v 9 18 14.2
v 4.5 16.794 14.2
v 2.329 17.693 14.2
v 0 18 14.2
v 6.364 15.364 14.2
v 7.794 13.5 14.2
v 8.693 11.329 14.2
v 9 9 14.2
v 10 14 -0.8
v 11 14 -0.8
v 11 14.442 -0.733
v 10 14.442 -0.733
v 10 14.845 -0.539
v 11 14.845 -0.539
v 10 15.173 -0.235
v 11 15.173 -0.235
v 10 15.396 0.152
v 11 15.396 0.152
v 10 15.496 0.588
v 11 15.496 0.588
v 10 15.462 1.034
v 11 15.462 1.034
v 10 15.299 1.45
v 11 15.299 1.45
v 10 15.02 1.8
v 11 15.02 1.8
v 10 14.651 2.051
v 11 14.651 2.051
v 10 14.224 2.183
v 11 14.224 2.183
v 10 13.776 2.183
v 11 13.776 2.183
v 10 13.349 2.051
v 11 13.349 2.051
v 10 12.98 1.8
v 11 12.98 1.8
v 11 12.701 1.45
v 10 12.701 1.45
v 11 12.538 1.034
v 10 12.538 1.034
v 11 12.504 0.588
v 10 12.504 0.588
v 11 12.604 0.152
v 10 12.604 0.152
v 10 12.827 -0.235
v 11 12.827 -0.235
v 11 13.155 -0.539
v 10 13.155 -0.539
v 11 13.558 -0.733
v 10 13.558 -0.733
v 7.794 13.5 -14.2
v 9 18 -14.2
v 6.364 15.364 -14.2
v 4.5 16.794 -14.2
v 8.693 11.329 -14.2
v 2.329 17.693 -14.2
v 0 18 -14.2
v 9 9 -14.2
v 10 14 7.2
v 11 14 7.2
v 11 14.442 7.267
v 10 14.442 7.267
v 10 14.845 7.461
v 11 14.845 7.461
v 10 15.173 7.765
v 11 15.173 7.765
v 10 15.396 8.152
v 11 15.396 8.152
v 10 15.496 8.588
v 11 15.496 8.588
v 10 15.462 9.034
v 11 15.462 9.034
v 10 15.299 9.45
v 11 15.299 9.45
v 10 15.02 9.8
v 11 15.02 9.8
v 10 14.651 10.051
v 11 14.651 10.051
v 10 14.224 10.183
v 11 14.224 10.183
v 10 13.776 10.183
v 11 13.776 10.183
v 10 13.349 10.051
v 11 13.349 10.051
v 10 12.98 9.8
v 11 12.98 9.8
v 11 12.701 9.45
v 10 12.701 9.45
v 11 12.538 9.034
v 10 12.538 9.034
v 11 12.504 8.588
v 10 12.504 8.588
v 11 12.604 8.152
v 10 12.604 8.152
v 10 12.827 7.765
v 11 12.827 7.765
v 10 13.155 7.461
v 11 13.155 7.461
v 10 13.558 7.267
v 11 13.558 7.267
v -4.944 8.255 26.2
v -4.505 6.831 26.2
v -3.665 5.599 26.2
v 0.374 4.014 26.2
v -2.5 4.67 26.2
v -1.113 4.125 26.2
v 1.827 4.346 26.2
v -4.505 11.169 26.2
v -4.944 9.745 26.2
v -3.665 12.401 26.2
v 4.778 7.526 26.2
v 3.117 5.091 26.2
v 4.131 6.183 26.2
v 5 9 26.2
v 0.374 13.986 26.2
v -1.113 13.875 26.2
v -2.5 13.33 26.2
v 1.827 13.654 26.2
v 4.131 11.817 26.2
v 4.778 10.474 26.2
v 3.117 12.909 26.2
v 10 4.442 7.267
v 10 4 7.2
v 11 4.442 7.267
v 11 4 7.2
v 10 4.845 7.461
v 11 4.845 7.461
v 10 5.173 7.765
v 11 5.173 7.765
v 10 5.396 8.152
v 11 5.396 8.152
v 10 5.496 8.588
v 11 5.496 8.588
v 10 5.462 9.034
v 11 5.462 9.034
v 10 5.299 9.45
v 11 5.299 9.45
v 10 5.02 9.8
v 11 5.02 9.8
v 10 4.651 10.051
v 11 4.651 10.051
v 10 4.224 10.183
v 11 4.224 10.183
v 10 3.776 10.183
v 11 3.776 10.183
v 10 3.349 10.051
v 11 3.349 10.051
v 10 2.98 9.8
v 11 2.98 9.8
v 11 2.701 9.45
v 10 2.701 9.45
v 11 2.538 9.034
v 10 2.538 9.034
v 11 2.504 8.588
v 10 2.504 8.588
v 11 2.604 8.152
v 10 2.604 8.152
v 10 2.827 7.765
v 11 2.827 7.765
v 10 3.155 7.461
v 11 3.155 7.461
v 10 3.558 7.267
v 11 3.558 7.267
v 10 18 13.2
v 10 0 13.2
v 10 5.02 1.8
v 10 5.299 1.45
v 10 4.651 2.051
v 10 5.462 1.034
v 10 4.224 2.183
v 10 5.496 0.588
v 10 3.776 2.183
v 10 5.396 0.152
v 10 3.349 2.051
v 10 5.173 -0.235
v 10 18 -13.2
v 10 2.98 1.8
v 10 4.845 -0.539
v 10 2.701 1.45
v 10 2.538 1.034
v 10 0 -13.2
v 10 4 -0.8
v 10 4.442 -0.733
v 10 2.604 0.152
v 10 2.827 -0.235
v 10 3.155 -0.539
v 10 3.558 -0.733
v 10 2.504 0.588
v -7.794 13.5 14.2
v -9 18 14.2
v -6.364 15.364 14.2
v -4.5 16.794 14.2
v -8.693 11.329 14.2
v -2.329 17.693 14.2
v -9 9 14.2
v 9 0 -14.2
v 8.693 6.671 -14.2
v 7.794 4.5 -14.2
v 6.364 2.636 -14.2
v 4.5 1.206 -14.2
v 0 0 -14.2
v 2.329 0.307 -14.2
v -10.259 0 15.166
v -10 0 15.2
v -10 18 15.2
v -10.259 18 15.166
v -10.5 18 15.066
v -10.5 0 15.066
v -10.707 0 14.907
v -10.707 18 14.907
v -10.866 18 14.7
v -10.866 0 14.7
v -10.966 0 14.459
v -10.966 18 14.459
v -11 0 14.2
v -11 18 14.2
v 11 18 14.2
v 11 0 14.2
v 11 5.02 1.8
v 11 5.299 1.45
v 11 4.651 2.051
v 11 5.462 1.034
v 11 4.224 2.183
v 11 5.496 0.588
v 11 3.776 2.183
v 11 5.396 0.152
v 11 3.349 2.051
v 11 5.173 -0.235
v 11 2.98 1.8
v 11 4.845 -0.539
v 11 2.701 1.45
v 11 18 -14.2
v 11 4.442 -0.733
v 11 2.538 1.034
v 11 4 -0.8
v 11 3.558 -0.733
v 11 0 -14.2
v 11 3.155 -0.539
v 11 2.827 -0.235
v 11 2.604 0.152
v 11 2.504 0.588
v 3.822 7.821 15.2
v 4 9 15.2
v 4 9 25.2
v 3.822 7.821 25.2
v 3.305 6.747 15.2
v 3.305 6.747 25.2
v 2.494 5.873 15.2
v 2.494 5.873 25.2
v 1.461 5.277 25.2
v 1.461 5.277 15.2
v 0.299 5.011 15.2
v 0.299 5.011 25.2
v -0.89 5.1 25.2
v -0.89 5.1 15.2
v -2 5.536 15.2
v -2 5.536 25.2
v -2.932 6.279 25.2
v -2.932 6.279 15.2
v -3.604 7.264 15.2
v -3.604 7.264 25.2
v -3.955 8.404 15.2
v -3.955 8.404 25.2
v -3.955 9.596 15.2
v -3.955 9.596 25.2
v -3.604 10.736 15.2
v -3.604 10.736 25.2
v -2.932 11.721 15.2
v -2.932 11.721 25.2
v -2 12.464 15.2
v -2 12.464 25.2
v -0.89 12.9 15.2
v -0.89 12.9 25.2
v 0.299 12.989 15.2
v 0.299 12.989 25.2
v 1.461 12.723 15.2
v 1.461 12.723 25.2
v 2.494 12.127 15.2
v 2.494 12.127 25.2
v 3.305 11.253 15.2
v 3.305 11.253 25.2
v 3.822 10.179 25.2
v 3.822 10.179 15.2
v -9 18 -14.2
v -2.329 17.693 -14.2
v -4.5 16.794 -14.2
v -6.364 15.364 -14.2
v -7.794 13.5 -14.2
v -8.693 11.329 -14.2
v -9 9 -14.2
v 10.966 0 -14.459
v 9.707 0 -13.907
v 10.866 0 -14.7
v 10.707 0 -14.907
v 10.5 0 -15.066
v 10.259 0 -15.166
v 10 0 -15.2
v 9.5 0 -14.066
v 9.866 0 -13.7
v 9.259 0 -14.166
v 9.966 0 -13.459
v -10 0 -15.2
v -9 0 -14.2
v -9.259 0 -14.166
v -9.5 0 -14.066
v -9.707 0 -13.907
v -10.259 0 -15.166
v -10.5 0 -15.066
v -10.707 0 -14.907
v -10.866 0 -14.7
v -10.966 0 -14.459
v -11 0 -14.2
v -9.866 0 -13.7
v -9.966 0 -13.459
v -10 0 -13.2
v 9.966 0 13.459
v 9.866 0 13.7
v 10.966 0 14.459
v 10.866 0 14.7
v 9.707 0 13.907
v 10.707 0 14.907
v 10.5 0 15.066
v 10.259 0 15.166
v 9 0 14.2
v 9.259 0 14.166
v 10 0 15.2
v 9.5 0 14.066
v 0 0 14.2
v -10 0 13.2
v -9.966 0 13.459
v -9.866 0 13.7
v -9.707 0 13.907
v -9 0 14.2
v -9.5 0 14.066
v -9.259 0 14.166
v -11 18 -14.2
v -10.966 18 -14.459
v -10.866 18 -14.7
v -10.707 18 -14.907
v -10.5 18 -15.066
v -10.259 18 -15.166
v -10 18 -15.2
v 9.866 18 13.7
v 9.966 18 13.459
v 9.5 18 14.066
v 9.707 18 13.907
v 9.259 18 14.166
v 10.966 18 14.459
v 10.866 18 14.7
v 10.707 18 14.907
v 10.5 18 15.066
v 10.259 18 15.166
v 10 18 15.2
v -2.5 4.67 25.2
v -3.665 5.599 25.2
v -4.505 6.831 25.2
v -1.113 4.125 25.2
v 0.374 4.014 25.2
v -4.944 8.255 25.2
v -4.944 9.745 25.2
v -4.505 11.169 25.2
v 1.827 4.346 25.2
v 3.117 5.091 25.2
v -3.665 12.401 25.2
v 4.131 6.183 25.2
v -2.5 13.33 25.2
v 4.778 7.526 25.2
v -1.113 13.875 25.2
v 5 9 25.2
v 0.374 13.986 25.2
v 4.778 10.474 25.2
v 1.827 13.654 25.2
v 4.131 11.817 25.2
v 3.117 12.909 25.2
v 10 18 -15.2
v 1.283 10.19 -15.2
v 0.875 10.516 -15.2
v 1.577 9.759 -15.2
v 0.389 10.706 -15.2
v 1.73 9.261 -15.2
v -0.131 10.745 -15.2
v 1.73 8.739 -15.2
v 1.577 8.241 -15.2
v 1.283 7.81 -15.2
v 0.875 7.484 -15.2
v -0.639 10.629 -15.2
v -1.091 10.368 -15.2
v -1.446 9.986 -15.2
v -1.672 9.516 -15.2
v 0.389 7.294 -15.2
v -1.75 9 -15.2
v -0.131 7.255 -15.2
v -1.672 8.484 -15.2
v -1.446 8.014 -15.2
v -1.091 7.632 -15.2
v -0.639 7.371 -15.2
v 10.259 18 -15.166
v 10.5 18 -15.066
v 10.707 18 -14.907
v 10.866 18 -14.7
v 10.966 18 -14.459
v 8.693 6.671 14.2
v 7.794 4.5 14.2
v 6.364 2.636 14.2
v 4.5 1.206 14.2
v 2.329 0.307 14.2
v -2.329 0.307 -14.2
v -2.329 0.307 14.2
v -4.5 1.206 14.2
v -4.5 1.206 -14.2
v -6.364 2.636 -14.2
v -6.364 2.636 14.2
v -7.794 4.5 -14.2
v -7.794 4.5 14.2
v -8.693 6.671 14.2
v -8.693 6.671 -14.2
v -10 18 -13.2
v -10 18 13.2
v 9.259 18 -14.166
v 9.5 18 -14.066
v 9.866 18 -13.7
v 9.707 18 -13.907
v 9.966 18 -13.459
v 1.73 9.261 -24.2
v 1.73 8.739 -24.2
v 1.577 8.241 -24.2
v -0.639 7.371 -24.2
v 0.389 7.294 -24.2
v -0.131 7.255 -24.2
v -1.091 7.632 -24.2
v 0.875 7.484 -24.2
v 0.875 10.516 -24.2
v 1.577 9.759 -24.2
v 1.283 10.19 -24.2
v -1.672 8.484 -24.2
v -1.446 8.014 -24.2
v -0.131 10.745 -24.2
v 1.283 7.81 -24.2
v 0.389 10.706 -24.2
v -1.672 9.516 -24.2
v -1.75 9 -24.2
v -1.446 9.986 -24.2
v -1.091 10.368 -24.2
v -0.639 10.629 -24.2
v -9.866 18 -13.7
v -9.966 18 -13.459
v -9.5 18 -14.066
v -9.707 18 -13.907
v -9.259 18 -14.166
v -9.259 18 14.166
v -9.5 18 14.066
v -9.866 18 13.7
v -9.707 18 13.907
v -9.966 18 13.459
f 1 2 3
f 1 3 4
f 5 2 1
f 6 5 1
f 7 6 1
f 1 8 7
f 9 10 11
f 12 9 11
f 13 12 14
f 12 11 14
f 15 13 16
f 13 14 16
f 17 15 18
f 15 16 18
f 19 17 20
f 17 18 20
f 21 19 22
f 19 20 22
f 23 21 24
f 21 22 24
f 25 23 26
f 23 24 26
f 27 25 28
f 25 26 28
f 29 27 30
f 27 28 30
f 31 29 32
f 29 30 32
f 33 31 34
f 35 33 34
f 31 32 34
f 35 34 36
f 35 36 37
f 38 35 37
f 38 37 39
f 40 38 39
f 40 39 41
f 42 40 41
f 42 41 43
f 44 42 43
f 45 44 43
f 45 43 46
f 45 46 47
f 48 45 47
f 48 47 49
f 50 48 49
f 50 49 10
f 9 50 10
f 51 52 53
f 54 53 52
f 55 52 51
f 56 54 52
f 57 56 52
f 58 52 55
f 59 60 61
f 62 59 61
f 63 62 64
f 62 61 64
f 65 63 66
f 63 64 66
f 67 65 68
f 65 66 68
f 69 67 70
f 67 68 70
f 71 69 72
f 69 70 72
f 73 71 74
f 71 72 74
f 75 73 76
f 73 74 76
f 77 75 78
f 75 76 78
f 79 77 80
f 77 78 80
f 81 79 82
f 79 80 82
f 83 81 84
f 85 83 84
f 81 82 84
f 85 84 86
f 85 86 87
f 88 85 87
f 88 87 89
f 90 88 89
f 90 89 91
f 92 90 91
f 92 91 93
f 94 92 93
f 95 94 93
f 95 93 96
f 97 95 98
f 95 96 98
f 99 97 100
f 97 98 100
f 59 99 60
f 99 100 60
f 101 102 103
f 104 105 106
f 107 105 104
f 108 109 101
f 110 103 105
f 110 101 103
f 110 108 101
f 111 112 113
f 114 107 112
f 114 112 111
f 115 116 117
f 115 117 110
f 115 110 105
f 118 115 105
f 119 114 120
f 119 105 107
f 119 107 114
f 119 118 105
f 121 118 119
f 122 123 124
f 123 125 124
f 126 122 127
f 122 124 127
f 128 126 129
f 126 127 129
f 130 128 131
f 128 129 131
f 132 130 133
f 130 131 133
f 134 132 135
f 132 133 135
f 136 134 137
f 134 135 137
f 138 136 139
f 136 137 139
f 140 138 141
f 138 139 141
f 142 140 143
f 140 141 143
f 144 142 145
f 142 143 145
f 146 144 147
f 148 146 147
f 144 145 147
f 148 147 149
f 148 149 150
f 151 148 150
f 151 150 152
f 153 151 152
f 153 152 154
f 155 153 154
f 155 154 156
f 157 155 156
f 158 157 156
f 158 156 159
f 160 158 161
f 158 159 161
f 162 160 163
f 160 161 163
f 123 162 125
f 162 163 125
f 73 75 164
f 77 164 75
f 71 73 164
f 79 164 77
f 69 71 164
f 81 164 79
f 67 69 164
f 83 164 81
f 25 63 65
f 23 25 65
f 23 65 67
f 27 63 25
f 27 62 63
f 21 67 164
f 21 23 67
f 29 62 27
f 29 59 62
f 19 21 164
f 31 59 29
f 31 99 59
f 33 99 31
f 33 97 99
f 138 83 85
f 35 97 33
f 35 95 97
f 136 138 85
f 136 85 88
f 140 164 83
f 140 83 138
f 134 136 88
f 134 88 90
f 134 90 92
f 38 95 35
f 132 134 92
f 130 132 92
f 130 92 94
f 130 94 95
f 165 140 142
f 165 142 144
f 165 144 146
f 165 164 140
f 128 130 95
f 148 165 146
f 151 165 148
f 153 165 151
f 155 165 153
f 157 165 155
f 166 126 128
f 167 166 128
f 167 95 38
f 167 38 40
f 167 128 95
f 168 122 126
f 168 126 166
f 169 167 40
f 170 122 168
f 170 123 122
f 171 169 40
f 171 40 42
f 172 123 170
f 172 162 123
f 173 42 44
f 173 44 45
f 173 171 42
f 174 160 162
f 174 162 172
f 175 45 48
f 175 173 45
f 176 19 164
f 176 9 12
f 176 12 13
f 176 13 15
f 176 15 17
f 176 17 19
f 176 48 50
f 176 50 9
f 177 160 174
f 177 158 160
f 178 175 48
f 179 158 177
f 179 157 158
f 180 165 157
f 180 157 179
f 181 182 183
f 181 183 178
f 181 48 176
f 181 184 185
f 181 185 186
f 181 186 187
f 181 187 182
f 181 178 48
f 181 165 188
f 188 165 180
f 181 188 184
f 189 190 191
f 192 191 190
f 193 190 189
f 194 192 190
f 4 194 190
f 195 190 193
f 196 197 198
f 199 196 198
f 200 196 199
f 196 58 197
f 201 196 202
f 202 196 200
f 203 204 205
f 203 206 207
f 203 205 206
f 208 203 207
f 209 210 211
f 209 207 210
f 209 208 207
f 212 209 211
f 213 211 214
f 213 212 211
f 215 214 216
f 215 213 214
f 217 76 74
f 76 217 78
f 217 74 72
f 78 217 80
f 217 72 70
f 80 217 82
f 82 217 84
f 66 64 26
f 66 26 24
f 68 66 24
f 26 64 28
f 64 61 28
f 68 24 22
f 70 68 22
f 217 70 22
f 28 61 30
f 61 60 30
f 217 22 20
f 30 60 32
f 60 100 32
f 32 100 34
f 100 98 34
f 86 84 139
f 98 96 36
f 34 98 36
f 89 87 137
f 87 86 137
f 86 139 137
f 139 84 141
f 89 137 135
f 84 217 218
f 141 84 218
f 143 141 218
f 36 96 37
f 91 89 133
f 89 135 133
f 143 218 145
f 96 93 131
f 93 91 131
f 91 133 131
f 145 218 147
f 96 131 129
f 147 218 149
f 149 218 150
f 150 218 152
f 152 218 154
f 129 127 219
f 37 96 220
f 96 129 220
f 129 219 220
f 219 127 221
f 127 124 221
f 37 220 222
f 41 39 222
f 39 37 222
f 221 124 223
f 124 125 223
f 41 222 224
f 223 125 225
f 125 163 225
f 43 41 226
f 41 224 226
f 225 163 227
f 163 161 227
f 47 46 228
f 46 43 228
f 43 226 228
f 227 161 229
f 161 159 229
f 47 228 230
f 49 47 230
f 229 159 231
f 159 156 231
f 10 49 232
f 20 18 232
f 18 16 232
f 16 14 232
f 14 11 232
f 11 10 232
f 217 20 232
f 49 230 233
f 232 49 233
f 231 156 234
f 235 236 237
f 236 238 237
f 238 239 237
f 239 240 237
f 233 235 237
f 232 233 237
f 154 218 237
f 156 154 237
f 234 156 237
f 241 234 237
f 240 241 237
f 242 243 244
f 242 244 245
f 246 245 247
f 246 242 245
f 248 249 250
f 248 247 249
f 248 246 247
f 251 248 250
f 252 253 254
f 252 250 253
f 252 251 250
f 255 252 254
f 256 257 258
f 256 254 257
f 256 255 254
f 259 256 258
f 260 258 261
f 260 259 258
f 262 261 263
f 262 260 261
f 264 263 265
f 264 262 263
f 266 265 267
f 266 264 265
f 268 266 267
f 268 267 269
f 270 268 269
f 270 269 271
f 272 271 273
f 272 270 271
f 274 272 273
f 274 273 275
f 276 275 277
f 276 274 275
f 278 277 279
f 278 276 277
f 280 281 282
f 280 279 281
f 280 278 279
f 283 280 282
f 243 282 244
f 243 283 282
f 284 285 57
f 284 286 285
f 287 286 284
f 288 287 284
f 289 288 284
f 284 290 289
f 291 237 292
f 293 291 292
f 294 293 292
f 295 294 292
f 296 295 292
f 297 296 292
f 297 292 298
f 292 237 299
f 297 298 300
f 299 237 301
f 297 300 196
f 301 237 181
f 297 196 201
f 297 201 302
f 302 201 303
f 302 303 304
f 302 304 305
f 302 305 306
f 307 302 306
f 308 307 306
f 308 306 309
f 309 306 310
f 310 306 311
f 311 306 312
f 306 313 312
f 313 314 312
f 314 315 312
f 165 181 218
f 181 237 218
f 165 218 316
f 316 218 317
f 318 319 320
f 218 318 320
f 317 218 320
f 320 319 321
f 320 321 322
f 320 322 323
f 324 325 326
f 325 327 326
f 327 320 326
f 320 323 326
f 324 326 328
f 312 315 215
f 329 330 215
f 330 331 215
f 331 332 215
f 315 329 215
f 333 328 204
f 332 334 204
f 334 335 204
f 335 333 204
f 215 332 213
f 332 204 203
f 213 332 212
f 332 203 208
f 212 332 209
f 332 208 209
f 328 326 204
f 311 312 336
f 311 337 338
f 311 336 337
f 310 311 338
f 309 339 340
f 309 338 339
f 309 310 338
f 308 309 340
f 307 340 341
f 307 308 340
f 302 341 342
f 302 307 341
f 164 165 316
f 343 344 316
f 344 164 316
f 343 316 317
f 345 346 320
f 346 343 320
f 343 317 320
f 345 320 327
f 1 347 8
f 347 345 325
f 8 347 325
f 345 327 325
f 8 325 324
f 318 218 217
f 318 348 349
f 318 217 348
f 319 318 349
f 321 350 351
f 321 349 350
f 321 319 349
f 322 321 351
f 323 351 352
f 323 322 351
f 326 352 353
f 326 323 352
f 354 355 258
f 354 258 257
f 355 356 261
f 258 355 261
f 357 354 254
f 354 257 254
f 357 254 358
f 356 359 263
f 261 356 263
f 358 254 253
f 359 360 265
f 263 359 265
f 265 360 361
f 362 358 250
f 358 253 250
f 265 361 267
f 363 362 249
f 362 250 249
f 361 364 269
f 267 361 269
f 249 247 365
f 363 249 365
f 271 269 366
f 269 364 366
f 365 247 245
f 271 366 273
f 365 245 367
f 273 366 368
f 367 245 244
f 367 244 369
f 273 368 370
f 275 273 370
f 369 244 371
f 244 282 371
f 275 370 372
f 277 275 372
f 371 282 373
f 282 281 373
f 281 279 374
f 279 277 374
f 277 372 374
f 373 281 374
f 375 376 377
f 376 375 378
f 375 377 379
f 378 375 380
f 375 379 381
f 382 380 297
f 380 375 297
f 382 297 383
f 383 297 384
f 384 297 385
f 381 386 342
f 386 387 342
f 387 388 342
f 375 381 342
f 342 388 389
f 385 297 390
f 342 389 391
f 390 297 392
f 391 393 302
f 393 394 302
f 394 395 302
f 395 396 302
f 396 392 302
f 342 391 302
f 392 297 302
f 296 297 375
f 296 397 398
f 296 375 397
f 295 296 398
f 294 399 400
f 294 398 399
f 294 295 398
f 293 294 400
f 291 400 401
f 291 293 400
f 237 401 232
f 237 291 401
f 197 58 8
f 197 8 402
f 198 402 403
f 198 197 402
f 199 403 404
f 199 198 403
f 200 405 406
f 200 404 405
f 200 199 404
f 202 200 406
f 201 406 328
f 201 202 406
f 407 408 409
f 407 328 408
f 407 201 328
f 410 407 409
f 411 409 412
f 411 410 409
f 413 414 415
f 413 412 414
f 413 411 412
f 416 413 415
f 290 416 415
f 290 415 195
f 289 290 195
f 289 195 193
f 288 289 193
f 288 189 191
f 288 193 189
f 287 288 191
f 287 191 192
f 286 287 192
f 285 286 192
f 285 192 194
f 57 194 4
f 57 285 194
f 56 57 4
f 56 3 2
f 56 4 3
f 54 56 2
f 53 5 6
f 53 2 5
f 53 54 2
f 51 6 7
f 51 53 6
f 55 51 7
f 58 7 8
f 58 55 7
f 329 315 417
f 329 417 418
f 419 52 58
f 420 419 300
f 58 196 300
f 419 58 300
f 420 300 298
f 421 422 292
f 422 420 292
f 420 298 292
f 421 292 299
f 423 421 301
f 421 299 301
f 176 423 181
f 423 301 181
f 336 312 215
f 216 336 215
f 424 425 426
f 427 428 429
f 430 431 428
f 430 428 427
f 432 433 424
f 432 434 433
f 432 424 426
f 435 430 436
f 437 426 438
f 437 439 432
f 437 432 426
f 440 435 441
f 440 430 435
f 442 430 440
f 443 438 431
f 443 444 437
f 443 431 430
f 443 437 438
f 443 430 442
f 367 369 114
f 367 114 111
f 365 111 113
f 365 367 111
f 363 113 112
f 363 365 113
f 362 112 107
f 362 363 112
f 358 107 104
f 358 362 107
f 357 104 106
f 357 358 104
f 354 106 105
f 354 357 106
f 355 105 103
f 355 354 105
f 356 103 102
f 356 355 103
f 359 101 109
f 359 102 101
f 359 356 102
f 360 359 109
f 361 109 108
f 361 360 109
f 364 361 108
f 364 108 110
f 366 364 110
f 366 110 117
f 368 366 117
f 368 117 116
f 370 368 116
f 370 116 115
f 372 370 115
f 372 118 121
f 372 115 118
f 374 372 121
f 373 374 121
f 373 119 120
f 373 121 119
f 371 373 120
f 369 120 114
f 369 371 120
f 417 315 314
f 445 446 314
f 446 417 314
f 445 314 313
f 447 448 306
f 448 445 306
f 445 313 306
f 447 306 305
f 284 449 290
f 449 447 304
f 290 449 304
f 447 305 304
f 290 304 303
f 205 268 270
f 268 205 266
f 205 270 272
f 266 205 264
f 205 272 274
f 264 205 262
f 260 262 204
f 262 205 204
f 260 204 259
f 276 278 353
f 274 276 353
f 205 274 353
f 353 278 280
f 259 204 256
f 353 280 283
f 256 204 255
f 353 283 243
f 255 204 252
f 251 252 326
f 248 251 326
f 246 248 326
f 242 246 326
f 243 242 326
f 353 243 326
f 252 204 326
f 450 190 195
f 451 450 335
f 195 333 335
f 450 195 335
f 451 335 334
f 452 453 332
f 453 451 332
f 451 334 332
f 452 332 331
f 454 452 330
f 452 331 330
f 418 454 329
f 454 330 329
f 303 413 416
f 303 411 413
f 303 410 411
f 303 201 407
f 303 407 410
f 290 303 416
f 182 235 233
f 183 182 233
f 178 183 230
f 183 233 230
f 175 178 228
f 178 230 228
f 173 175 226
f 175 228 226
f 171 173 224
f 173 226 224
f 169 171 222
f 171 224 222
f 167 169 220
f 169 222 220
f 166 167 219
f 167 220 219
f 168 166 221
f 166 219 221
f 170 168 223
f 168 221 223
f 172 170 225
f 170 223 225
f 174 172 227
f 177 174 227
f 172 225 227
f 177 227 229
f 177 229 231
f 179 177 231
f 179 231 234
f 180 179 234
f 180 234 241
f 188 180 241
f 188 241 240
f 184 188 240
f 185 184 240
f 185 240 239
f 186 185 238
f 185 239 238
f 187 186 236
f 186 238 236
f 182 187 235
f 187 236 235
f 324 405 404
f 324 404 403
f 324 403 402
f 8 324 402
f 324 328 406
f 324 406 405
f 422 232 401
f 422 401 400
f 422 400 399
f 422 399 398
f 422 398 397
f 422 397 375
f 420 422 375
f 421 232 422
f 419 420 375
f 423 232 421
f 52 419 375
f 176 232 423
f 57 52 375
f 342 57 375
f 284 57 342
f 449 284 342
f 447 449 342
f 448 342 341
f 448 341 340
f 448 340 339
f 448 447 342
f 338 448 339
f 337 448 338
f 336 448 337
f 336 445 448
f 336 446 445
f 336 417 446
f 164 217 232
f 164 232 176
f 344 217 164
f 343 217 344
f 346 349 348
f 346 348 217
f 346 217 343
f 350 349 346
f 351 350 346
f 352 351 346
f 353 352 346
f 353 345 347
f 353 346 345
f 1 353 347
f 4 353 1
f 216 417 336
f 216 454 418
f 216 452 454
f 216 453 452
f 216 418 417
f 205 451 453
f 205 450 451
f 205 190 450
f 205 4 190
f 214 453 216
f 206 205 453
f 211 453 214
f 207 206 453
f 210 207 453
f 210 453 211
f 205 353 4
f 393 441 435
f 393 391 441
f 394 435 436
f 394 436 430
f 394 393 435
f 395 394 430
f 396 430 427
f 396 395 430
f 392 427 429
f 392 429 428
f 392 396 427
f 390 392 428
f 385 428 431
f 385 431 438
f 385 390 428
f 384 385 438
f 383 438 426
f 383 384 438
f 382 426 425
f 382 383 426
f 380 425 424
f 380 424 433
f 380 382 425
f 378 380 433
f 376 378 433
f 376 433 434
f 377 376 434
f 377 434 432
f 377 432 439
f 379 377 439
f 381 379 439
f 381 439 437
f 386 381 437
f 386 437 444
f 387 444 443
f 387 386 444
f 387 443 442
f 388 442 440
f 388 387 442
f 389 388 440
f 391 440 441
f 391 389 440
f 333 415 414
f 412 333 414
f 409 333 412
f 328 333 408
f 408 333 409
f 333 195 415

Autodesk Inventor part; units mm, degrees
ref_plane "YZ Plane" through (0, 0, 0) normal (1, 0, 0) x (0, 1, 0)
ref_plane "XZ Plane" through (0, 0, 0) normal (0, 1, 0) x (-1, 0, 0)
ref_plane "XY Plane" through (0, 0, 0) normal (0, 0, 1) x (1, 0, 0)
sketch "Sketch1" plane through (0, 0, 0) normal (0, 1, 0) x (-1, 0, 0)
  line L0 (-11, 14.2) -> (-11, -14.2)
  line L1 (-10, -15.2) -> (10, -15.2)
  line L2 (11, -14.2) -> (11, 14.2)
  line L3 (10, 15.2) -> (-10, 15.2)
  line L4 (-11, 15.2) -> (11, -15.2) construction
  line L5 (-11, -15.2) -> (11, 15.2) construction
  line L6 (-10, 13.2) -> (-10, -13.2)
  line L7 (-9, -14.2) -> (9, -14.2)
  line L8 (10, -13.2) -> (10, 13.2)
  line L9 (9, 14.2) -> (-9, 14.2)
  line L10 (-10, 14.2) -> (10, -14.2) construction
  line L11 (-10, -14.2) -> (10, 14.2) construction
  arc A0 (11, 14.2) -> (10, 15.2) centre (10, 14.2) ccw
  arc A1 (10, 13.2) -> (9, 14.2) centre (9, 13.2) ccw
  arc A2 (9, -14.2) -> (10, -13.2) centre (9, -13.2) ccw
  arc A3 (10, -15.2) -> (11, -14.2) centre (10, -14.2) ccw
  arc A4 (-10, -13.2) -> (-9, -14.2) centre (-9, -13.2) ccw
  arc A5 (-11, -14.2) -> (-10, -15.2) centre (-10, -14.2) ccw
  arc A6 (-10, 15.2) -> (-11, 14.2) centre (-10, 14.2) ccw
  arc A7 (-9, 14.2) -> (-10, 13.2) centre (-9, 13.2) ccw
  point P0 (0, 0)
  dimension "d0" = 30.4
  dimension "d1" = 22
  dimension "d2" = 28.4
  dimension "d3" = 20
  dimension "d4" = 1
  dimension "d5" = 1
extrude "Extrusion1" add sketch "Sketch1" along normal blind 18
sketch "Sketch3" plane through (-9, 0, -14.2) normal (0, 0, 1) x (1, 0, 0)
  line L0 (9, 0) -> (9, 9)
  circle A0 centre (9, 9) radius 9
  dimension "d12" = 9
  dimension "d13" = 18
extrude "Extrusion3" add sketch "Sketch3" along normal up to surface (28.4 mm away)
sketch "Sketch4" plane through (-10, 0, 15.2) normal (0, 0, 1) x (1, 0, 0)
  circle A0 centre (10, 9) radius 4
  point P0 (10, 0)
  dimension "d16" = 8
extrude "Extrusion4" add sketch "Sketch4" along normal blind 10
sketch "Sketch5" plane through (0, 9, 25.2) normal (0, 0, 1) x (1, 0, 0)
  circle A0 centre (0, 0) radius 5
  point P0 (0, -9)
  dimension "d19" = 10
extrude "Extrusion5" add sketch "Sketch5" along normal blind 1
sketch "Sketch7" plane through (10, 0, -15.2) normal (0, 0, -1) x (-1, 0, 0)
  line L0 (10, 9) -> (10, 0)
  circle A0 centre (10, 9) radius 1.75
  dimension "d22" = 3.5
extrude "Extrusion6" add sketch "Sketch7" along normal blind 9
sketch "Sketch8" plane through (11, 0, 14.2) normal (1, 0, 0) x (0, 0, -1)
  line L0 (-1, 0) -> (-1, 18) projected
  line L1 (-1, 9) -> (5.5, 9)
  line L2 (5.5, 9) -> (5.5, 14)
  line L3 (5.5, 14) -> (5.5, 4)
  line L4 (5.5, 4) -> (13.5, 4)
  line L5 (13.5, 4) -> (13.5, 14)
  circle A0 centre (5.5, 14) radius 1.5
  circle A1 centre (13.5, 14) radius 1.5
  circle A2 centre (13.5, 4) radius 1.5
  circle A3 centre (5.5, 4) radius 1.5
  point P0 (14.2, 0)
  dimension "d25" = 6.5
  dimension "d26" = 5
  dimension "d27" = 10
  dimension "d28" = 8
  dimension "d29" = 3
  dimension "d30" = 3
  dimension "d31" = 3
  dimension "d32" = 3
extrude "Extrusion7" cut sketch "Sketch8" against normal blind 2
properties part number "Solenoid"
